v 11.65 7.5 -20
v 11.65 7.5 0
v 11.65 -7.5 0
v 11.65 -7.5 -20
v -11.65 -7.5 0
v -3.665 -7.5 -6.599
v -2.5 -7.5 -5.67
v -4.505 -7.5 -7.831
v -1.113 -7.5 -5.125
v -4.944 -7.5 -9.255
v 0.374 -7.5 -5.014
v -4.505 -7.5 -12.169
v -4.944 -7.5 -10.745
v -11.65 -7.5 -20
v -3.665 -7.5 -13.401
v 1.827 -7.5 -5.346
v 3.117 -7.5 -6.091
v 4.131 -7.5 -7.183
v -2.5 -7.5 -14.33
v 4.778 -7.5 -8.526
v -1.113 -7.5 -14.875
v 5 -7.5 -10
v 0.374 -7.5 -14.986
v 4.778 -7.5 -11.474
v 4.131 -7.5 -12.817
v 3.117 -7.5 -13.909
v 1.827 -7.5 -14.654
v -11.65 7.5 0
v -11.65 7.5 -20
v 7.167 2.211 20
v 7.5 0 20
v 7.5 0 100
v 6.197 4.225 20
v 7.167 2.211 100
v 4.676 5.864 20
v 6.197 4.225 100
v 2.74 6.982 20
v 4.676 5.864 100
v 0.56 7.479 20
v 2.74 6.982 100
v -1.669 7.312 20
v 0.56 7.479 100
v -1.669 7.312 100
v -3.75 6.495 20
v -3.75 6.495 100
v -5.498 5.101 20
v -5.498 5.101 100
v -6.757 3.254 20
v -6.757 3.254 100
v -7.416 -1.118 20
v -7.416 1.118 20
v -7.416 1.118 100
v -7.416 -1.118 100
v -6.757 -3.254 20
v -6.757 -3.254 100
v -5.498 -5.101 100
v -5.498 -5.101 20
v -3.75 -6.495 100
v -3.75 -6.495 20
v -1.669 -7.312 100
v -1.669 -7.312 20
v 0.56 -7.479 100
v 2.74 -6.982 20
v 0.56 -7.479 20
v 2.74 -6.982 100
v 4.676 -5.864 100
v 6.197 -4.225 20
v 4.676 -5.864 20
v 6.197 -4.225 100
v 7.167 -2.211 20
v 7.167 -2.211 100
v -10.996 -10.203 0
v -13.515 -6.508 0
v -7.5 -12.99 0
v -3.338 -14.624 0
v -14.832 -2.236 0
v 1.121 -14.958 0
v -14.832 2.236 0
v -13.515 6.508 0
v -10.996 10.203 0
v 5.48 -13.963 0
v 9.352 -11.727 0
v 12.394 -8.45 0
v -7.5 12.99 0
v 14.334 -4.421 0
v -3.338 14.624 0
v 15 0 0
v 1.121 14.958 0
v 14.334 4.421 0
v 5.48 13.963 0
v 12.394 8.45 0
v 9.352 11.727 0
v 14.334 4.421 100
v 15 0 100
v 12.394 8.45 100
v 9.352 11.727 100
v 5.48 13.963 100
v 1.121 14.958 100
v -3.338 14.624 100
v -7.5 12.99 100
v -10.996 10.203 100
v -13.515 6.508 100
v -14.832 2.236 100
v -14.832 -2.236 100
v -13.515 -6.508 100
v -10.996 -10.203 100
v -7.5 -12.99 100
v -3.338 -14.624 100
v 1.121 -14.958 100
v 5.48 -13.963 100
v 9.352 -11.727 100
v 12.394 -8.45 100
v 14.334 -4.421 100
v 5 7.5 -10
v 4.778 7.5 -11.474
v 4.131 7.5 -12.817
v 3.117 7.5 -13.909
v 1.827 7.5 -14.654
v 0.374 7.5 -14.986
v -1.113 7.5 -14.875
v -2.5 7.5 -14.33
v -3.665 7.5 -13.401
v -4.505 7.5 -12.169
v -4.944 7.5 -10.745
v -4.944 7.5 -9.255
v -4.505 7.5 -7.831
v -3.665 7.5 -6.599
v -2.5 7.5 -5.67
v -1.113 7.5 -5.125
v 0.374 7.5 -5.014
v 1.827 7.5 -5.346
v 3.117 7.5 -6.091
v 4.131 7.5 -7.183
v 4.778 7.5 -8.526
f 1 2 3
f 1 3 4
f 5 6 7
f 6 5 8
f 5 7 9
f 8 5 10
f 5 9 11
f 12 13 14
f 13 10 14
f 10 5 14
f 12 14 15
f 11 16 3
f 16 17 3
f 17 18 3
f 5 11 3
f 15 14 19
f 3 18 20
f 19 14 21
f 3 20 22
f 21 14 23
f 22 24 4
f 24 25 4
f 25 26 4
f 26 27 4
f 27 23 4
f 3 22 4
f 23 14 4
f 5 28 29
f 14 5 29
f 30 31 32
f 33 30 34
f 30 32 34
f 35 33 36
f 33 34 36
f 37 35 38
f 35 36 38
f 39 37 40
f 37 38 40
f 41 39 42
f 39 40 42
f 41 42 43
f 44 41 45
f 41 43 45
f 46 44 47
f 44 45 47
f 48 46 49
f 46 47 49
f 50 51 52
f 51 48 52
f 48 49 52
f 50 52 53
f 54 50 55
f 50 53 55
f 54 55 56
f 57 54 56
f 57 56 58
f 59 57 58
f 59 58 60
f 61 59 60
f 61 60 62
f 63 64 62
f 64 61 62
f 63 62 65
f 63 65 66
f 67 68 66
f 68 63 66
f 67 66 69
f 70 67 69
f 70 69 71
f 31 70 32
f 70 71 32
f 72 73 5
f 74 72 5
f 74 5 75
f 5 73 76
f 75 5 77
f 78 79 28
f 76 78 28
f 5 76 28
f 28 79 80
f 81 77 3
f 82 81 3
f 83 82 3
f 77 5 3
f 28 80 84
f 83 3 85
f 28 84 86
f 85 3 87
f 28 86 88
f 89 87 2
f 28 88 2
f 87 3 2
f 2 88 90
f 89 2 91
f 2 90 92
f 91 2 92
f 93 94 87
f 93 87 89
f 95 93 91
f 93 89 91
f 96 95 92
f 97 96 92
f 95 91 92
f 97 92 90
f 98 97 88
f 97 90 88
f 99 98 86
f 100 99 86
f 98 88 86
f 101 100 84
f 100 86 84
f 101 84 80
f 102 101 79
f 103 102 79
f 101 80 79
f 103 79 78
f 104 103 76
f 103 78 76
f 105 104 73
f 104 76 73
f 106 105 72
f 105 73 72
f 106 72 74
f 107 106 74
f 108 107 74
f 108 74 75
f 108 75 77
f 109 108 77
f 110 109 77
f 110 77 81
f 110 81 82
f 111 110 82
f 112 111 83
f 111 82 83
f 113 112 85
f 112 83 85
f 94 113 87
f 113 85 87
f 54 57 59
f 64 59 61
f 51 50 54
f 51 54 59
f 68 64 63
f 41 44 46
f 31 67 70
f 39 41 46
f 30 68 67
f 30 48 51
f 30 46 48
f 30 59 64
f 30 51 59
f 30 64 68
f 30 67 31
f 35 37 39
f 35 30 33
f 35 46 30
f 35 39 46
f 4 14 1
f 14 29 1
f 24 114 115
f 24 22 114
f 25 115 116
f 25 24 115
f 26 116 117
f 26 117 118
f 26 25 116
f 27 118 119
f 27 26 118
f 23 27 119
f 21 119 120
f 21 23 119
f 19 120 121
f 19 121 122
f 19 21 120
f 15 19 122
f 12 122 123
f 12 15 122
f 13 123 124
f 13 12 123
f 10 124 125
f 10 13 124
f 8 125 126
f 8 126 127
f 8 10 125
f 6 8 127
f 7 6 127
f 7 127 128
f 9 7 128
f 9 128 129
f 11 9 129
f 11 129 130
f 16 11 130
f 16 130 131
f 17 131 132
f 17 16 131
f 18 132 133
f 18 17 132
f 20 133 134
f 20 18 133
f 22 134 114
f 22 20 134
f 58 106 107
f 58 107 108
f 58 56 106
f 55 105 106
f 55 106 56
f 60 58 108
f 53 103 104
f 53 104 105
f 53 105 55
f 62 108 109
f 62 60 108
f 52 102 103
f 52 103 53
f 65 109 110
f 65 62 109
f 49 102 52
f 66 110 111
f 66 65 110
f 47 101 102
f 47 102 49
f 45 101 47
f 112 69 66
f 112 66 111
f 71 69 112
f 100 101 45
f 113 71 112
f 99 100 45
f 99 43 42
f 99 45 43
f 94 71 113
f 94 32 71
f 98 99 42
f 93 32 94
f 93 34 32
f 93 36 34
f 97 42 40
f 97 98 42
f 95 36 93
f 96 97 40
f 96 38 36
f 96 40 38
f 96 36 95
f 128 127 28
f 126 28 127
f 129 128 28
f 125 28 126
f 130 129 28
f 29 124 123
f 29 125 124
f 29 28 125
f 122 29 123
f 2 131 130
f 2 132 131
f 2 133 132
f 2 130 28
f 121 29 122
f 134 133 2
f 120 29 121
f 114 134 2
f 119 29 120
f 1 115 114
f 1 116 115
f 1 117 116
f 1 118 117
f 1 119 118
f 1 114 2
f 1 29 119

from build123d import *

# Parameters (mm, degrees)
SKETCH1_R           = 15
BOSS_EXTRUDE1_DEPTH = 100
SKETCH2_R           = 7.5
CUT_EXTRUDE1_DEPTH  = 130
SKETCH3_W           = 23.300503328
SKETCH3_H           = 40
SKETCH3_R           = 5
BOSS_EXTRUDE2_DEPTH = 7.5


with BuildPart() as part:
    # Sketch1 → Boss-Extrude1 (new body)
    with BuildSketch(Plane.XY):
        Circle(SKETCH1_R)
    extrude(amount=BOSS_EXTRUDE1_DEPTH)

    # Sketch2 → Cut-Extrude1 (cut)
    with BuildSketch(Plane.XY.offset(100)):
        Circle(SKETCH2_R)
    extrude(amount=-CUT_EXTRUDE1_DEPTH, mode=Mode.SUBTRACT)

    # Sketch3 → Boss-Extrude2 (add, symmetric)
    with BuildSketch(Plane(origin=(0, 0, 0), x_dir=(1, 0, 0), z_dir=(0, 1, 0))):
        Rectangle(SKETCH3_W, SKETCH3_H)
        with Locations((0, 10)):
            Circle(SKETCH3_R, mode=Mode.SUBTRACT)
    extrude(amount=BOSS_EXTRUDE2_DEPTH, both=True)


solid = part.part
